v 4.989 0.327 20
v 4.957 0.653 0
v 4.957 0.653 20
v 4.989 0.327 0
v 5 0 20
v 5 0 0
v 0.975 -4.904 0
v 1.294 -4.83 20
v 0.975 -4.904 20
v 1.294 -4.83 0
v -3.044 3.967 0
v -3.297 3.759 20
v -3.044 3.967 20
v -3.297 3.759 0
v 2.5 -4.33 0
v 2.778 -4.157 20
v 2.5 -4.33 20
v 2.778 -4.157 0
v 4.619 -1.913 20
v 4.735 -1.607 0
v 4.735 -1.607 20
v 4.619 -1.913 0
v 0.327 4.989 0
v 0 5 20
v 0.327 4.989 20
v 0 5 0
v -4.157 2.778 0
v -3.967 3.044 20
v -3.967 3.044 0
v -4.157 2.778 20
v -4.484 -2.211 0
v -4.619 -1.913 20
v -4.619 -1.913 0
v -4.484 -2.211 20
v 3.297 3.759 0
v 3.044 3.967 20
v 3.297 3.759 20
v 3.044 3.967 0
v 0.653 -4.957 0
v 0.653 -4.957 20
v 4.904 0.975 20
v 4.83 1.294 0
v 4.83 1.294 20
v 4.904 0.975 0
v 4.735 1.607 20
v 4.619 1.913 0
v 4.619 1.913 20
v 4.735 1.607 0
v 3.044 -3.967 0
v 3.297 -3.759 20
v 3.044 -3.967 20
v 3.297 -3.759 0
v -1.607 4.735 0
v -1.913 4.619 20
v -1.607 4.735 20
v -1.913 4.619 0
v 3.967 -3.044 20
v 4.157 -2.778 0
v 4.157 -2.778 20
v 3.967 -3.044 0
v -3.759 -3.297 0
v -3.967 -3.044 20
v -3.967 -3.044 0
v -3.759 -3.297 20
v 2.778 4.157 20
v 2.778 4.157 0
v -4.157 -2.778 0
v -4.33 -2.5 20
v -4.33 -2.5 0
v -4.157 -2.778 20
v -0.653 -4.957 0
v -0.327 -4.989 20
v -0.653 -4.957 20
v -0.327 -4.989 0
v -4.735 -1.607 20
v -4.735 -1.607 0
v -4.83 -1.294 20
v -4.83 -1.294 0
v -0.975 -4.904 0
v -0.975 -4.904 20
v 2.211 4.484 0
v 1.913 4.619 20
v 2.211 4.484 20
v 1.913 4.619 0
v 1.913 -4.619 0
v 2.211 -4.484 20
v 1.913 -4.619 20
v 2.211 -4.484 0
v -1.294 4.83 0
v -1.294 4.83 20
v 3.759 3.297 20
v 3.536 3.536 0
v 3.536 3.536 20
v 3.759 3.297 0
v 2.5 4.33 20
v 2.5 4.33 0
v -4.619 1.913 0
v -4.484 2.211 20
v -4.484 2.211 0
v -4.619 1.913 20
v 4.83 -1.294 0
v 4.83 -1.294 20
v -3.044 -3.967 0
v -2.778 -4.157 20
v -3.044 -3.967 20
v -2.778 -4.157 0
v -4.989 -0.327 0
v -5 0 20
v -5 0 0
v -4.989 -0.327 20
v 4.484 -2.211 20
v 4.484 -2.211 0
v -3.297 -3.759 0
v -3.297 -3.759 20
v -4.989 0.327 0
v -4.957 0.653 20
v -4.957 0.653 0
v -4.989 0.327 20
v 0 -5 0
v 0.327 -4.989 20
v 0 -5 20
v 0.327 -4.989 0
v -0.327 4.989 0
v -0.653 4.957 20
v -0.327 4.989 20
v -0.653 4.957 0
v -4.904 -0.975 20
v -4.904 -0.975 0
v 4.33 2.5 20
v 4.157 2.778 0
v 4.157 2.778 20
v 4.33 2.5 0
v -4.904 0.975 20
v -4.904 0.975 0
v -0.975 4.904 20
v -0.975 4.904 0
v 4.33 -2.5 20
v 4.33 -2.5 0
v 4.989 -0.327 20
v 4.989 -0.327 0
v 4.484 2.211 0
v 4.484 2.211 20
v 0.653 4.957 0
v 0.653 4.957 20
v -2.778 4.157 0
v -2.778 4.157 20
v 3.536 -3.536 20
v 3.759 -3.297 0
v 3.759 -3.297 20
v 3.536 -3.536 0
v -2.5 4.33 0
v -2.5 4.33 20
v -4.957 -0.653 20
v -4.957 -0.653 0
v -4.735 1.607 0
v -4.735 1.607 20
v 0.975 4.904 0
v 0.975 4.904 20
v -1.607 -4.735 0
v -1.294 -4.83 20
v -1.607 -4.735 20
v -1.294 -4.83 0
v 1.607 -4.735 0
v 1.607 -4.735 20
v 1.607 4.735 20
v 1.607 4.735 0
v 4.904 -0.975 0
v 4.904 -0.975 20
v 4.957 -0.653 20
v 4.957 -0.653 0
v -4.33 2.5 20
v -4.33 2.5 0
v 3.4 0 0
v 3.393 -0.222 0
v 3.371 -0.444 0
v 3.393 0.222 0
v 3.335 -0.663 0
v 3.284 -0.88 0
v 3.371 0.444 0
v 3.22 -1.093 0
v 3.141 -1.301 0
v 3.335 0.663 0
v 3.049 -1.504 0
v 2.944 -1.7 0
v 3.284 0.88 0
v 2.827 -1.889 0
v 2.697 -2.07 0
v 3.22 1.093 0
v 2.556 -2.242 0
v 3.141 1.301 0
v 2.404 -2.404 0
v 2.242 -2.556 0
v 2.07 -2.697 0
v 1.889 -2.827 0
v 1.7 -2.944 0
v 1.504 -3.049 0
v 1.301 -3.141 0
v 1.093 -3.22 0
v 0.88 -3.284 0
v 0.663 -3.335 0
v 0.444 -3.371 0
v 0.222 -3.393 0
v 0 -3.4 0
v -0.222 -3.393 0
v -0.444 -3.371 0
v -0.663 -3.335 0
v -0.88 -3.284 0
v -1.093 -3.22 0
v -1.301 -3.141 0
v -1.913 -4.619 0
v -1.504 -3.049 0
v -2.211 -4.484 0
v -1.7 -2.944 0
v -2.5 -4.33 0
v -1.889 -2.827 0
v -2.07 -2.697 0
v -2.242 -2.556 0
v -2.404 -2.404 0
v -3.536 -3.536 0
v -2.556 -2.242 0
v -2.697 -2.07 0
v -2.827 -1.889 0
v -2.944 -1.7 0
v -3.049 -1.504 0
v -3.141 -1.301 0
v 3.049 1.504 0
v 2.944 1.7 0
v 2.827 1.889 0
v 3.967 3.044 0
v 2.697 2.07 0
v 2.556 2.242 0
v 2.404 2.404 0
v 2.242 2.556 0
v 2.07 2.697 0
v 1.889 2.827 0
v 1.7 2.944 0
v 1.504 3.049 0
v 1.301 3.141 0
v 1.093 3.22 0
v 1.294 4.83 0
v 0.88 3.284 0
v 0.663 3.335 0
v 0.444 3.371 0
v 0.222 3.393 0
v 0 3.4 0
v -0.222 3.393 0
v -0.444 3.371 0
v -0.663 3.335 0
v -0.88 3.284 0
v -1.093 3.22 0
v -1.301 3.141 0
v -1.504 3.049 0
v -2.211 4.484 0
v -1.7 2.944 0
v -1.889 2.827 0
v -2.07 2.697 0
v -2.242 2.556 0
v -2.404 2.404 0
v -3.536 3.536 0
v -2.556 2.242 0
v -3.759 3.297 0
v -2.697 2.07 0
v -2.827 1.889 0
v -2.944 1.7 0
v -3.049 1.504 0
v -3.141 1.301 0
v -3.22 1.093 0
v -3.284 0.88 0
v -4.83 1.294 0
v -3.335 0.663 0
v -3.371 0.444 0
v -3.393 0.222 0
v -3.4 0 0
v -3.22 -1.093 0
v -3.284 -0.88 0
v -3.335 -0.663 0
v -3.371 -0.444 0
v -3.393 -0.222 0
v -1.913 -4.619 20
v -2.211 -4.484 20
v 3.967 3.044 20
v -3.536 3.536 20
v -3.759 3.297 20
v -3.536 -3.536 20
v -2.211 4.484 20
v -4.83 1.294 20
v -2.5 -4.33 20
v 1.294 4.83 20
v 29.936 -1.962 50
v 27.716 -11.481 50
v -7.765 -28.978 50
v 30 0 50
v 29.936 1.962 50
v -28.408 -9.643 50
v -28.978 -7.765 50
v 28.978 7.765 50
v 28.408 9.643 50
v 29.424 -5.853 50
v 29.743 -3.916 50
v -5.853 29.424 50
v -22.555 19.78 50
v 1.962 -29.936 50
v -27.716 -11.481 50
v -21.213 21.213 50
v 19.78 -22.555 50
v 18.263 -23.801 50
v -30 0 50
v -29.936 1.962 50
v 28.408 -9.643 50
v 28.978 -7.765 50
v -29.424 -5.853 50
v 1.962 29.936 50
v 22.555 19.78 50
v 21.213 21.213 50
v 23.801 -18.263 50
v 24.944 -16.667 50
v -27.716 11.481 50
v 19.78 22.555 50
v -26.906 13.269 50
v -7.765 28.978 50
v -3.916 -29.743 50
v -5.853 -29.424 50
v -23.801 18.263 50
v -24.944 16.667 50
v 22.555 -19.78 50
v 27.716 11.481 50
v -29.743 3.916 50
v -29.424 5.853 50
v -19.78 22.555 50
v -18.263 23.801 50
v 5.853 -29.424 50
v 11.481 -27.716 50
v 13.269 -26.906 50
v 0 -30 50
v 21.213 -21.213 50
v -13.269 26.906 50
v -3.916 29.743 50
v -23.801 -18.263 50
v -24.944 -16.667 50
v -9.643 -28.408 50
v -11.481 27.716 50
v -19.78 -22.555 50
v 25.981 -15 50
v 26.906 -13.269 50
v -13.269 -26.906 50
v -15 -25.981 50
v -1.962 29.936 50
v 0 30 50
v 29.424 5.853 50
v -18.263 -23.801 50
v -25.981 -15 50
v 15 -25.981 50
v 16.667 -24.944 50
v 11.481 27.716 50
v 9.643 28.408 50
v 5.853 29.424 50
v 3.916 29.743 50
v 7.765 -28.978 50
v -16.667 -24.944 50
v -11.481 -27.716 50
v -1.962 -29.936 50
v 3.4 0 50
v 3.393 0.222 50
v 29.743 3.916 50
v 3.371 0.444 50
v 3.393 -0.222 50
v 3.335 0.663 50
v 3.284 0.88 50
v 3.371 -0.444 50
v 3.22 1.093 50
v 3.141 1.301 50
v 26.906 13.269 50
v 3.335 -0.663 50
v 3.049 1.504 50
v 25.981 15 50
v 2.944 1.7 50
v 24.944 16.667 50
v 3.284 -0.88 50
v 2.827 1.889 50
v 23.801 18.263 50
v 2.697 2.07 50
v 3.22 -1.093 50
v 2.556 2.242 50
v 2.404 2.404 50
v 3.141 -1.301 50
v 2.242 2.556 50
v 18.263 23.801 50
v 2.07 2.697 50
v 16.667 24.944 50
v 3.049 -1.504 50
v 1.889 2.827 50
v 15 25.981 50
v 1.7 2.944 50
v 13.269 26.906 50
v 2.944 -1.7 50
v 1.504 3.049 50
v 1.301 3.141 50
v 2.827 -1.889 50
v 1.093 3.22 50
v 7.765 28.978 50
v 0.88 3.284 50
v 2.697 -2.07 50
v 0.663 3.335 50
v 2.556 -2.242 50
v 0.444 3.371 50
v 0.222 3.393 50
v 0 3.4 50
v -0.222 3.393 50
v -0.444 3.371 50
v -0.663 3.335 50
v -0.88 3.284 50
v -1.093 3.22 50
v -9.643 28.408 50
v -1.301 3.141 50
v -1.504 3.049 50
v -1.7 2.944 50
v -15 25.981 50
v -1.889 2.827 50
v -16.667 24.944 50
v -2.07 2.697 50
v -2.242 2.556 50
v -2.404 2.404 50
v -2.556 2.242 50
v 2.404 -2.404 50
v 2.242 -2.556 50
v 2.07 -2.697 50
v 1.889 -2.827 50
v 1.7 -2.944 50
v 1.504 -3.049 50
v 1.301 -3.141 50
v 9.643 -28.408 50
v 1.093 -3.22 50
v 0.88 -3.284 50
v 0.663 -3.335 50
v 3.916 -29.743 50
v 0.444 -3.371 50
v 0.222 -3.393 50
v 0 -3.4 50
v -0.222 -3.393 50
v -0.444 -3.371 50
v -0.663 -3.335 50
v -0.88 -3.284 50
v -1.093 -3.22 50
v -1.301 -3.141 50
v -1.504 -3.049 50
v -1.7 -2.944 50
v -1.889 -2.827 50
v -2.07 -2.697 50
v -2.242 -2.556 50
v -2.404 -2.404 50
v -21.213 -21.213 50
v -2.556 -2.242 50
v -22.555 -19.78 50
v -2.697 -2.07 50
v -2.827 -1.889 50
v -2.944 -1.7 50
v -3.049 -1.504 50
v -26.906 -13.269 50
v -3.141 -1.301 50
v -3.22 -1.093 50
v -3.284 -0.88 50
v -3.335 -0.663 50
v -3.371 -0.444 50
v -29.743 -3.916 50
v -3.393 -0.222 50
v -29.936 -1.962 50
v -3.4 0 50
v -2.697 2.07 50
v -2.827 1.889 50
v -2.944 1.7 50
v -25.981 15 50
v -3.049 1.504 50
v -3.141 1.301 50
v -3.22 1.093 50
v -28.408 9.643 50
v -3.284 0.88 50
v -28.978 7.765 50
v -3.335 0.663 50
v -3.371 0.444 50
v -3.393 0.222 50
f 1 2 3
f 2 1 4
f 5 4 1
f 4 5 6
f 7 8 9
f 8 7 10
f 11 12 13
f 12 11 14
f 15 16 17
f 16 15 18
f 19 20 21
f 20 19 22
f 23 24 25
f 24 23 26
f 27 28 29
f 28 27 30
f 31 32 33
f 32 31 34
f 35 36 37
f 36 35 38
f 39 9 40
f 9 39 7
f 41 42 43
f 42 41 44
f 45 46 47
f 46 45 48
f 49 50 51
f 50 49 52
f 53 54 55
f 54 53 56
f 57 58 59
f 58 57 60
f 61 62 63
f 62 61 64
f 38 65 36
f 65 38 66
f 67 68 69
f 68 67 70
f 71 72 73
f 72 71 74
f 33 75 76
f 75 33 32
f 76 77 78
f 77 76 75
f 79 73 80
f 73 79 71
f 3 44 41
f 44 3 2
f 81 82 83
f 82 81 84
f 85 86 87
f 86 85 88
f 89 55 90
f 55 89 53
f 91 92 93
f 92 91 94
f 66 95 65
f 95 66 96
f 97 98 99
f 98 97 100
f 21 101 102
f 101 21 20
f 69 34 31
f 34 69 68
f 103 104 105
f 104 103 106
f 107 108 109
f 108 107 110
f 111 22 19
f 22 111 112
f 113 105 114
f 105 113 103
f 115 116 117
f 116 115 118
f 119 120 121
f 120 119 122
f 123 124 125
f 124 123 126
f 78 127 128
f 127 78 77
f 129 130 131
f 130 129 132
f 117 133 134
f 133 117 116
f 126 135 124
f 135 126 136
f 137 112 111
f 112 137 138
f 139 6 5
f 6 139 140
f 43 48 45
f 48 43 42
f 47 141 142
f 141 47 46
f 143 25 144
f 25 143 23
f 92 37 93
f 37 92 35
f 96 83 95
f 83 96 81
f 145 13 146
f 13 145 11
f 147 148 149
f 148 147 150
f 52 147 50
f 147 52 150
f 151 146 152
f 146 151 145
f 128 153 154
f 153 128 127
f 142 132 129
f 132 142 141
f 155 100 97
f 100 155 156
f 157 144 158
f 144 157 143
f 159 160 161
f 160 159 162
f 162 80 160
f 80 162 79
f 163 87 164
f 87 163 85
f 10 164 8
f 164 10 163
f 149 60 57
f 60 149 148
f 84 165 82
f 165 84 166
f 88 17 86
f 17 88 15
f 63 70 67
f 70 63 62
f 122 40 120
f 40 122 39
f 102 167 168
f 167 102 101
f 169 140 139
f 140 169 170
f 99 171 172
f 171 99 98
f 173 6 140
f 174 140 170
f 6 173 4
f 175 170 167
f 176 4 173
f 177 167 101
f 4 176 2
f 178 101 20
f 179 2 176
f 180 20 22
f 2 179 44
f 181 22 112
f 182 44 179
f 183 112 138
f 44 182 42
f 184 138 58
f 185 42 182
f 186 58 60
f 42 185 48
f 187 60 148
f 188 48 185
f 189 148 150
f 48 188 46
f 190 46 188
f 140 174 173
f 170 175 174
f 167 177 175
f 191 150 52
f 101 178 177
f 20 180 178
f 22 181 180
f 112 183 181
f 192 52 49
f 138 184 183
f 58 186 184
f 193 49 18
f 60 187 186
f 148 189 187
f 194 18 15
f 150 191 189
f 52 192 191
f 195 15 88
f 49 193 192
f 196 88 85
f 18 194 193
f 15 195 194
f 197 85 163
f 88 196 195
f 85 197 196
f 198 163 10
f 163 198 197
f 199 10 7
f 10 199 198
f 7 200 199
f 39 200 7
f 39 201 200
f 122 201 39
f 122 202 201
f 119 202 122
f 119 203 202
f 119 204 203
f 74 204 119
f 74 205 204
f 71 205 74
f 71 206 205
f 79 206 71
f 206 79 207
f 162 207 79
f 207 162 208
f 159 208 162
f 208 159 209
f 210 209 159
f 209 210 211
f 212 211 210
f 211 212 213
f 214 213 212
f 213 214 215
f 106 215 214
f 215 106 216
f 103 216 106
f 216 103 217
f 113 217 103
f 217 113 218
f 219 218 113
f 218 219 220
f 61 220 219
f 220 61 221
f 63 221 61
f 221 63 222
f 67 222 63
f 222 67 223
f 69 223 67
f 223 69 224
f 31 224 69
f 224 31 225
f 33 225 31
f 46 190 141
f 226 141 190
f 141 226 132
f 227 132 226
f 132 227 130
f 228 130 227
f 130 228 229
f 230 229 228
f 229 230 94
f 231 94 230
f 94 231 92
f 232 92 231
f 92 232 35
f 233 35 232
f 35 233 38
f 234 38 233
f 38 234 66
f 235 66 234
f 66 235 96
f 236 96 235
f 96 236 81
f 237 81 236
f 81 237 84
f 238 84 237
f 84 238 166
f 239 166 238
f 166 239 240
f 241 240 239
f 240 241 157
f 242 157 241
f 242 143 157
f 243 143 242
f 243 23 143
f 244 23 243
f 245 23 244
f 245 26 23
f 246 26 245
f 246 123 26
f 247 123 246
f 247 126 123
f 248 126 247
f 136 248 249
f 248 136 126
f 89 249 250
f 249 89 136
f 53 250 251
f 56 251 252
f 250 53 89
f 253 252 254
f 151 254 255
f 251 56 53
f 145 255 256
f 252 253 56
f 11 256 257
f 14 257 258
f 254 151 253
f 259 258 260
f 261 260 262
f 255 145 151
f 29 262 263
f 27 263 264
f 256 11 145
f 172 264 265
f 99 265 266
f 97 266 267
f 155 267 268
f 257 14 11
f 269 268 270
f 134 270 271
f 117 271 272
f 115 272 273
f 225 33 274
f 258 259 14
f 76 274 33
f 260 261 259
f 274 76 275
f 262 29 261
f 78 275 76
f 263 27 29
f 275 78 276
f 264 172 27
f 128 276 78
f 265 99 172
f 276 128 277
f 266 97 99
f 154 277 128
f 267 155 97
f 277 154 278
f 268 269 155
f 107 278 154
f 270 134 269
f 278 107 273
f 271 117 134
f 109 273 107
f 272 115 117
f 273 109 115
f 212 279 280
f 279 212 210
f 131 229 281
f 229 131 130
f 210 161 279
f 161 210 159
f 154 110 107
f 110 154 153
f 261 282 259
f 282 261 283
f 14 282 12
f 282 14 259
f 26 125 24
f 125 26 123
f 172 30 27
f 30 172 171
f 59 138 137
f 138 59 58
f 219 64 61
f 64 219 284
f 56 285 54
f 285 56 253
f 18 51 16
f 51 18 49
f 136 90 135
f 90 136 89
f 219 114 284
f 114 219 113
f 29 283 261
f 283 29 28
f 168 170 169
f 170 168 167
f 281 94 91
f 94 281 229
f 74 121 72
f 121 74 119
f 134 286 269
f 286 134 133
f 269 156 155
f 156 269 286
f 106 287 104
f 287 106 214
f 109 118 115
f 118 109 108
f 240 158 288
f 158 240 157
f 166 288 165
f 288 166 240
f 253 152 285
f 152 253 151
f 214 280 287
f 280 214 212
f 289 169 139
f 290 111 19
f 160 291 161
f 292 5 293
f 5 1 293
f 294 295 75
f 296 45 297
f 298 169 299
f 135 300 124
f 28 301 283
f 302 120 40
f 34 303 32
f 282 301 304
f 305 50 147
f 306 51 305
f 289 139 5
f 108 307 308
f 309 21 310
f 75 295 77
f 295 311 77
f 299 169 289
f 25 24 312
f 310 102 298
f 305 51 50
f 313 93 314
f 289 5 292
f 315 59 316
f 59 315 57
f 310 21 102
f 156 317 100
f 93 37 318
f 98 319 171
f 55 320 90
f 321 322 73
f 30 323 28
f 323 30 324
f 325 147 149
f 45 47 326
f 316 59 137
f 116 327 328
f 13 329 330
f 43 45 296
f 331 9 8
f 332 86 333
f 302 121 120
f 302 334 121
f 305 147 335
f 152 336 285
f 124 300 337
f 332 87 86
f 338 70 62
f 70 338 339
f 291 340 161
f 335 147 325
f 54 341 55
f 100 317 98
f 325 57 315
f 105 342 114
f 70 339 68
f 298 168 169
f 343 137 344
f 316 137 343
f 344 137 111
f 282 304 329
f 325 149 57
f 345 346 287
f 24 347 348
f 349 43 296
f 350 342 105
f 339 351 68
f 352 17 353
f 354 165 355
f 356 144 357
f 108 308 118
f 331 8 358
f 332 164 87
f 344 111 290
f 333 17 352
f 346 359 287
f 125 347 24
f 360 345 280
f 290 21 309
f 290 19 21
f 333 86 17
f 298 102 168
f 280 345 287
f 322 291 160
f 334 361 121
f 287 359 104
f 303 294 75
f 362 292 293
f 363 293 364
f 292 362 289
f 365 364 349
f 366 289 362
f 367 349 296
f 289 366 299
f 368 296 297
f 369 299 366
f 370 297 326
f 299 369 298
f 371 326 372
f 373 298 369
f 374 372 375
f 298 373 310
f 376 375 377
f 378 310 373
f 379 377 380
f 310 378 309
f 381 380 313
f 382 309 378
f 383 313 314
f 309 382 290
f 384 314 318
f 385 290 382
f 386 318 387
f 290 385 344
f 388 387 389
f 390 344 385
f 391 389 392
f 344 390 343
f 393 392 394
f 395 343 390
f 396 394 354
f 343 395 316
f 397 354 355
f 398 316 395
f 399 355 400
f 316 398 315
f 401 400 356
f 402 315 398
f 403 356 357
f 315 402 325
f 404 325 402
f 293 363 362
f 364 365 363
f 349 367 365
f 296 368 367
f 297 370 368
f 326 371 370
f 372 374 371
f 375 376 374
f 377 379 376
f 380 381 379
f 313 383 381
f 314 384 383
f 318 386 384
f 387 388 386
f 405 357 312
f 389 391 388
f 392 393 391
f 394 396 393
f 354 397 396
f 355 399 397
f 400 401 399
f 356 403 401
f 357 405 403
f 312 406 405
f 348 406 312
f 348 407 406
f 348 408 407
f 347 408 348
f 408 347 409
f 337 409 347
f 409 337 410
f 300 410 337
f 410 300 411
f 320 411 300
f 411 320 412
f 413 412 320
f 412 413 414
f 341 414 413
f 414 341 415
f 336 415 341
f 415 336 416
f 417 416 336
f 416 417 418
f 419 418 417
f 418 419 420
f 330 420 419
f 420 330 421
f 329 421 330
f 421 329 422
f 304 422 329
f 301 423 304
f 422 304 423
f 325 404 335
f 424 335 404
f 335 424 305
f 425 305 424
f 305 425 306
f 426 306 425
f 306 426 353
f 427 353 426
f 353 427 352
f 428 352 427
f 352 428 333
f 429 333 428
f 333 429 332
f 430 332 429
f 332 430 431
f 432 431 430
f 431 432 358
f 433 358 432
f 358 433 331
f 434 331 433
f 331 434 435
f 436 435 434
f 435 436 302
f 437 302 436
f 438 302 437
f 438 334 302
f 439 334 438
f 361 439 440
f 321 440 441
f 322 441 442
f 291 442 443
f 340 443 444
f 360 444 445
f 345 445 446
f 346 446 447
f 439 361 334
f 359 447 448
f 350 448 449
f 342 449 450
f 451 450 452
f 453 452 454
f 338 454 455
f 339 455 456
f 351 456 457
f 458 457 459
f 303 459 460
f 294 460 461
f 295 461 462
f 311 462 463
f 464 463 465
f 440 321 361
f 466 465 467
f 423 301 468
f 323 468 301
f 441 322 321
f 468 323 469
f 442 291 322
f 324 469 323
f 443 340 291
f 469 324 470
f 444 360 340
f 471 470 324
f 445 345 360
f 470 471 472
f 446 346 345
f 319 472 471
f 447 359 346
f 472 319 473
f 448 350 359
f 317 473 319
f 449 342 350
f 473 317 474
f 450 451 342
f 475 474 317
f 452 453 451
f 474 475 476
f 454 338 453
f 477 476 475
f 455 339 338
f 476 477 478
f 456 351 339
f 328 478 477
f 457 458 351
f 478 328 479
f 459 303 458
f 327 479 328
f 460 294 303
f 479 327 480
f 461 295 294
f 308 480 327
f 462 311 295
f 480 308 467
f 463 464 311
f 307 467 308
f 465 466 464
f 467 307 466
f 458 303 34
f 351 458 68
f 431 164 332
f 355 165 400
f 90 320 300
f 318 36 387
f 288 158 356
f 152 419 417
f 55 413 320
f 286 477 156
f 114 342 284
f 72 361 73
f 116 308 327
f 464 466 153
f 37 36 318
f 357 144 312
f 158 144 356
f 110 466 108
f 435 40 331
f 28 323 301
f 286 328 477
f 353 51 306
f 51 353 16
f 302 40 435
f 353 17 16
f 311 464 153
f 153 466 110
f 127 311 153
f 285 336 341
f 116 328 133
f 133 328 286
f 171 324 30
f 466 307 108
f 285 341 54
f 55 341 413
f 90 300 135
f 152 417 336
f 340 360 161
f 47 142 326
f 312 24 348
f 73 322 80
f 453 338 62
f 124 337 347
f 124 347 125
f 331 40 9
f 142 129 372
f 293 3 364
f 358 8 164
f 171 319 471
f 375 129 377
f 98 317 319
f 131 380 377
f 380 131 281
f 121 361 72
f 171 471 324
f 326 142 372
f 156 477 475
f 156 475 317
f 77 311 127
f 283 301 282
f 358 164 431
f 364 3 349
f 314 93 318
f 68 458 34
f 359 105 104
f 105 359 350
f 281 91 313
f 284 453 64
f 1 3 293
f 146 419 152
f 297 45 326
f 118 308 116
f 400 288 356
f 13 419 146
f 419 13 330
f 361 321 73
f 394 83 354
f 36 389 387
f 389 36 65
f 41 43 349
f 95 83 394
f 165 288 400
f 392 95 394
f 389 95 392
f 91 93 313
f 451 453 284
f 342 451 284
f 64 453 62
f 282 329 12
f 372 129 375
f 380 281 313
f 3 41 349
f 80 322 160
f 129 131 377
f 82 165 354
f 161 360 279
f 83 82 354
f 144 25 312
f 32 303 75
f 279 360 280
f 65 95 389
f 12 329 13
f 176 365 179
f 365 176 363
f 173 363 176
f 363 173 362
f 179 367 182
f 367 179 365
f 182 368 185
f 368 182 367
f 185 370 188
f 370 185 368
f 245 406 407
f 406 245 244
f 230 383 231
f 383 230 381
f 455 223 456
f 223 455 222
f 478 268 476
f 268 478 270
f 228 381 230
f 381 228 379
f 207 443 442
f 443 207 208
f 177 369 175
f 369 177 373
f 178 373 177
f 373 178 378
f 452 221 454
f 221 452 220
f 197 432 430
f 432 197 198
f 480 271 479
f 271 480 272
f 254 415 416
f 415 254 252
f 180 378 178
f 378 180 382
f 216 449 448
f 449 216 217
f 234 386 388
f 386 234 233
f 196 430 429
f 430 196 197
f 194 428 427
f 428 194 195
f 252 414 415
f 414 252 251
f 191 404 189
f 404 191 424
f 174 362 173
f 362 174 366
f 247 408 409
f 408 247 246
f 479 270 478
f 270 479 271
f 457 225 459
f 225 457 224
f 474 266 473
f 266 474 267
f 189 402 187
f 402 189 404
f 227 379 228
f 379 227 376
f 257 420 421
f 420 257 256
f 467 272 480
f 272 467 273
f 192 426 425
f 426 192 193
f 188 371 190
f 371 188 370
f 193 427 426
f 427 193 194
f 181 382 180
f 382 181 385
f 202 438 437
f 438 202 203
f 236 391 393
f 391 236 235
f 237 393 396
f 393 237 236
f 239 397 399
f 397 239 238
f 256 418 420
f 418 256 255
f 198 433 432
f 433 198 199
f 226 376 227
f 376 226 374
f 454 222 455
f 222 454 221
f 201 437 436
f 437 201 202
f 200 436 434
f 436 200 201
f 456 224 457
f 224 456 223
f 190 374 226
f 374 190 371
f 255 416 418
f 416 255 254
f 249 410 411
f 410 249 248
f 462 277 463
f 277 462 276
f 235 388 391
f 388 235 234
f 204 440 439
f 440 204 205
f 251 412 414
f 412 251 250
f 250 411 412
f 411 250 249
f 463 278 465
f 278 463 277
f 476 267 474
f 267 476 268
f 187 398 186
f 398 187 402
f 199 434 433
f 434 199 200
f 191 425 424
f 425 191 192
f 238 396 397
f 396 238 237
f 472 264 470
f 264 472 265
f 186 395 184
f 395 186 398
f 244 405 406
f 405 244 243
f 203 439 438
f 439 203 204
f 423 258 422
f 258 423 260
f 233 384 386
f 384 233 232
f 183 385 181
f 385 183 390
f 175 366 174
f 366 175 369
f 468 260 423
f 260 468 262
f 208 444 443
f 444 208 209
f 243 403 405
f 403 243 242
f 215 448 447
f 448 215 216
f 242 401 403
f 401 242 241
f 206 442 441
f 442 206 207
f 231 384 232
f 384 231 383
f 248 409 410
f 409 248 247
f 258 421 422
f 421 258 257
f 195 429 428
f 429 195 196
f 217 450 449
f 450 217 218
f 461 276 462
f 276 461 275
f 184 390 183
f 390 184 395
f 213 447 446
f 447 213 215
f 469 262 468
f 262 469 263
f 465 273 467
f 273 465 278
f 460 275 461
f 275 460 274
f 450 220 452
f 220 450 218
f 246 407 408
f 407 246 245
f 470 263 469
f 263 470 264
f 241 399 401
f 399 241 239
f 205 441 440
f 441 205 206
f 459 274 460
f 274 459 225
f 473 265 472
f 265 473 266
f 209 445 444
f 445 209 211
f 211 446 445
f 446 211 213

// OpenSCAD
// Small lab funnel - printed upright, open top and bottom
// Units: mm. Wall thickness: 1.6 mm throughout.

$fn = 96;

// ---- Spout (tube) ----
spout_od     = 10;     // spout outer diameter
spout_id     = spout_od - 2 * 1.6;  // bore = 6.8 mm
spout_len    = 20;     // spout length (z = 0 to 20)

// ---- Cone (funnel body) ----
cone_d0      = 10;     // cone outer diameter at z = 20 (joins spout)
cone_d1      = 60;     // cone outer diameter at rim (z = 50)
cone_h       = 30;     // cone height (z = 20 to 50)

// ---- Cutting overlap ----
eps          = 0.5;    // extension of cutters past faces

difference() {
    union() {
        // Spout
        cylinder(h = spout_len, d = spout_od);
        // Cone
        translate([0, 0, spout_len])
            cylinder(h = cone_h, d1 = cone_d0, d2 = cone_d1);
    }
    // Through-bore: spout bore extended above and below,
    // then continued through the cone so the hole stays straight.
    translate([0, 0, -eps])
        cylinder(h = spout_len + cone_h + 2 * eps, d = spout_id);
}
